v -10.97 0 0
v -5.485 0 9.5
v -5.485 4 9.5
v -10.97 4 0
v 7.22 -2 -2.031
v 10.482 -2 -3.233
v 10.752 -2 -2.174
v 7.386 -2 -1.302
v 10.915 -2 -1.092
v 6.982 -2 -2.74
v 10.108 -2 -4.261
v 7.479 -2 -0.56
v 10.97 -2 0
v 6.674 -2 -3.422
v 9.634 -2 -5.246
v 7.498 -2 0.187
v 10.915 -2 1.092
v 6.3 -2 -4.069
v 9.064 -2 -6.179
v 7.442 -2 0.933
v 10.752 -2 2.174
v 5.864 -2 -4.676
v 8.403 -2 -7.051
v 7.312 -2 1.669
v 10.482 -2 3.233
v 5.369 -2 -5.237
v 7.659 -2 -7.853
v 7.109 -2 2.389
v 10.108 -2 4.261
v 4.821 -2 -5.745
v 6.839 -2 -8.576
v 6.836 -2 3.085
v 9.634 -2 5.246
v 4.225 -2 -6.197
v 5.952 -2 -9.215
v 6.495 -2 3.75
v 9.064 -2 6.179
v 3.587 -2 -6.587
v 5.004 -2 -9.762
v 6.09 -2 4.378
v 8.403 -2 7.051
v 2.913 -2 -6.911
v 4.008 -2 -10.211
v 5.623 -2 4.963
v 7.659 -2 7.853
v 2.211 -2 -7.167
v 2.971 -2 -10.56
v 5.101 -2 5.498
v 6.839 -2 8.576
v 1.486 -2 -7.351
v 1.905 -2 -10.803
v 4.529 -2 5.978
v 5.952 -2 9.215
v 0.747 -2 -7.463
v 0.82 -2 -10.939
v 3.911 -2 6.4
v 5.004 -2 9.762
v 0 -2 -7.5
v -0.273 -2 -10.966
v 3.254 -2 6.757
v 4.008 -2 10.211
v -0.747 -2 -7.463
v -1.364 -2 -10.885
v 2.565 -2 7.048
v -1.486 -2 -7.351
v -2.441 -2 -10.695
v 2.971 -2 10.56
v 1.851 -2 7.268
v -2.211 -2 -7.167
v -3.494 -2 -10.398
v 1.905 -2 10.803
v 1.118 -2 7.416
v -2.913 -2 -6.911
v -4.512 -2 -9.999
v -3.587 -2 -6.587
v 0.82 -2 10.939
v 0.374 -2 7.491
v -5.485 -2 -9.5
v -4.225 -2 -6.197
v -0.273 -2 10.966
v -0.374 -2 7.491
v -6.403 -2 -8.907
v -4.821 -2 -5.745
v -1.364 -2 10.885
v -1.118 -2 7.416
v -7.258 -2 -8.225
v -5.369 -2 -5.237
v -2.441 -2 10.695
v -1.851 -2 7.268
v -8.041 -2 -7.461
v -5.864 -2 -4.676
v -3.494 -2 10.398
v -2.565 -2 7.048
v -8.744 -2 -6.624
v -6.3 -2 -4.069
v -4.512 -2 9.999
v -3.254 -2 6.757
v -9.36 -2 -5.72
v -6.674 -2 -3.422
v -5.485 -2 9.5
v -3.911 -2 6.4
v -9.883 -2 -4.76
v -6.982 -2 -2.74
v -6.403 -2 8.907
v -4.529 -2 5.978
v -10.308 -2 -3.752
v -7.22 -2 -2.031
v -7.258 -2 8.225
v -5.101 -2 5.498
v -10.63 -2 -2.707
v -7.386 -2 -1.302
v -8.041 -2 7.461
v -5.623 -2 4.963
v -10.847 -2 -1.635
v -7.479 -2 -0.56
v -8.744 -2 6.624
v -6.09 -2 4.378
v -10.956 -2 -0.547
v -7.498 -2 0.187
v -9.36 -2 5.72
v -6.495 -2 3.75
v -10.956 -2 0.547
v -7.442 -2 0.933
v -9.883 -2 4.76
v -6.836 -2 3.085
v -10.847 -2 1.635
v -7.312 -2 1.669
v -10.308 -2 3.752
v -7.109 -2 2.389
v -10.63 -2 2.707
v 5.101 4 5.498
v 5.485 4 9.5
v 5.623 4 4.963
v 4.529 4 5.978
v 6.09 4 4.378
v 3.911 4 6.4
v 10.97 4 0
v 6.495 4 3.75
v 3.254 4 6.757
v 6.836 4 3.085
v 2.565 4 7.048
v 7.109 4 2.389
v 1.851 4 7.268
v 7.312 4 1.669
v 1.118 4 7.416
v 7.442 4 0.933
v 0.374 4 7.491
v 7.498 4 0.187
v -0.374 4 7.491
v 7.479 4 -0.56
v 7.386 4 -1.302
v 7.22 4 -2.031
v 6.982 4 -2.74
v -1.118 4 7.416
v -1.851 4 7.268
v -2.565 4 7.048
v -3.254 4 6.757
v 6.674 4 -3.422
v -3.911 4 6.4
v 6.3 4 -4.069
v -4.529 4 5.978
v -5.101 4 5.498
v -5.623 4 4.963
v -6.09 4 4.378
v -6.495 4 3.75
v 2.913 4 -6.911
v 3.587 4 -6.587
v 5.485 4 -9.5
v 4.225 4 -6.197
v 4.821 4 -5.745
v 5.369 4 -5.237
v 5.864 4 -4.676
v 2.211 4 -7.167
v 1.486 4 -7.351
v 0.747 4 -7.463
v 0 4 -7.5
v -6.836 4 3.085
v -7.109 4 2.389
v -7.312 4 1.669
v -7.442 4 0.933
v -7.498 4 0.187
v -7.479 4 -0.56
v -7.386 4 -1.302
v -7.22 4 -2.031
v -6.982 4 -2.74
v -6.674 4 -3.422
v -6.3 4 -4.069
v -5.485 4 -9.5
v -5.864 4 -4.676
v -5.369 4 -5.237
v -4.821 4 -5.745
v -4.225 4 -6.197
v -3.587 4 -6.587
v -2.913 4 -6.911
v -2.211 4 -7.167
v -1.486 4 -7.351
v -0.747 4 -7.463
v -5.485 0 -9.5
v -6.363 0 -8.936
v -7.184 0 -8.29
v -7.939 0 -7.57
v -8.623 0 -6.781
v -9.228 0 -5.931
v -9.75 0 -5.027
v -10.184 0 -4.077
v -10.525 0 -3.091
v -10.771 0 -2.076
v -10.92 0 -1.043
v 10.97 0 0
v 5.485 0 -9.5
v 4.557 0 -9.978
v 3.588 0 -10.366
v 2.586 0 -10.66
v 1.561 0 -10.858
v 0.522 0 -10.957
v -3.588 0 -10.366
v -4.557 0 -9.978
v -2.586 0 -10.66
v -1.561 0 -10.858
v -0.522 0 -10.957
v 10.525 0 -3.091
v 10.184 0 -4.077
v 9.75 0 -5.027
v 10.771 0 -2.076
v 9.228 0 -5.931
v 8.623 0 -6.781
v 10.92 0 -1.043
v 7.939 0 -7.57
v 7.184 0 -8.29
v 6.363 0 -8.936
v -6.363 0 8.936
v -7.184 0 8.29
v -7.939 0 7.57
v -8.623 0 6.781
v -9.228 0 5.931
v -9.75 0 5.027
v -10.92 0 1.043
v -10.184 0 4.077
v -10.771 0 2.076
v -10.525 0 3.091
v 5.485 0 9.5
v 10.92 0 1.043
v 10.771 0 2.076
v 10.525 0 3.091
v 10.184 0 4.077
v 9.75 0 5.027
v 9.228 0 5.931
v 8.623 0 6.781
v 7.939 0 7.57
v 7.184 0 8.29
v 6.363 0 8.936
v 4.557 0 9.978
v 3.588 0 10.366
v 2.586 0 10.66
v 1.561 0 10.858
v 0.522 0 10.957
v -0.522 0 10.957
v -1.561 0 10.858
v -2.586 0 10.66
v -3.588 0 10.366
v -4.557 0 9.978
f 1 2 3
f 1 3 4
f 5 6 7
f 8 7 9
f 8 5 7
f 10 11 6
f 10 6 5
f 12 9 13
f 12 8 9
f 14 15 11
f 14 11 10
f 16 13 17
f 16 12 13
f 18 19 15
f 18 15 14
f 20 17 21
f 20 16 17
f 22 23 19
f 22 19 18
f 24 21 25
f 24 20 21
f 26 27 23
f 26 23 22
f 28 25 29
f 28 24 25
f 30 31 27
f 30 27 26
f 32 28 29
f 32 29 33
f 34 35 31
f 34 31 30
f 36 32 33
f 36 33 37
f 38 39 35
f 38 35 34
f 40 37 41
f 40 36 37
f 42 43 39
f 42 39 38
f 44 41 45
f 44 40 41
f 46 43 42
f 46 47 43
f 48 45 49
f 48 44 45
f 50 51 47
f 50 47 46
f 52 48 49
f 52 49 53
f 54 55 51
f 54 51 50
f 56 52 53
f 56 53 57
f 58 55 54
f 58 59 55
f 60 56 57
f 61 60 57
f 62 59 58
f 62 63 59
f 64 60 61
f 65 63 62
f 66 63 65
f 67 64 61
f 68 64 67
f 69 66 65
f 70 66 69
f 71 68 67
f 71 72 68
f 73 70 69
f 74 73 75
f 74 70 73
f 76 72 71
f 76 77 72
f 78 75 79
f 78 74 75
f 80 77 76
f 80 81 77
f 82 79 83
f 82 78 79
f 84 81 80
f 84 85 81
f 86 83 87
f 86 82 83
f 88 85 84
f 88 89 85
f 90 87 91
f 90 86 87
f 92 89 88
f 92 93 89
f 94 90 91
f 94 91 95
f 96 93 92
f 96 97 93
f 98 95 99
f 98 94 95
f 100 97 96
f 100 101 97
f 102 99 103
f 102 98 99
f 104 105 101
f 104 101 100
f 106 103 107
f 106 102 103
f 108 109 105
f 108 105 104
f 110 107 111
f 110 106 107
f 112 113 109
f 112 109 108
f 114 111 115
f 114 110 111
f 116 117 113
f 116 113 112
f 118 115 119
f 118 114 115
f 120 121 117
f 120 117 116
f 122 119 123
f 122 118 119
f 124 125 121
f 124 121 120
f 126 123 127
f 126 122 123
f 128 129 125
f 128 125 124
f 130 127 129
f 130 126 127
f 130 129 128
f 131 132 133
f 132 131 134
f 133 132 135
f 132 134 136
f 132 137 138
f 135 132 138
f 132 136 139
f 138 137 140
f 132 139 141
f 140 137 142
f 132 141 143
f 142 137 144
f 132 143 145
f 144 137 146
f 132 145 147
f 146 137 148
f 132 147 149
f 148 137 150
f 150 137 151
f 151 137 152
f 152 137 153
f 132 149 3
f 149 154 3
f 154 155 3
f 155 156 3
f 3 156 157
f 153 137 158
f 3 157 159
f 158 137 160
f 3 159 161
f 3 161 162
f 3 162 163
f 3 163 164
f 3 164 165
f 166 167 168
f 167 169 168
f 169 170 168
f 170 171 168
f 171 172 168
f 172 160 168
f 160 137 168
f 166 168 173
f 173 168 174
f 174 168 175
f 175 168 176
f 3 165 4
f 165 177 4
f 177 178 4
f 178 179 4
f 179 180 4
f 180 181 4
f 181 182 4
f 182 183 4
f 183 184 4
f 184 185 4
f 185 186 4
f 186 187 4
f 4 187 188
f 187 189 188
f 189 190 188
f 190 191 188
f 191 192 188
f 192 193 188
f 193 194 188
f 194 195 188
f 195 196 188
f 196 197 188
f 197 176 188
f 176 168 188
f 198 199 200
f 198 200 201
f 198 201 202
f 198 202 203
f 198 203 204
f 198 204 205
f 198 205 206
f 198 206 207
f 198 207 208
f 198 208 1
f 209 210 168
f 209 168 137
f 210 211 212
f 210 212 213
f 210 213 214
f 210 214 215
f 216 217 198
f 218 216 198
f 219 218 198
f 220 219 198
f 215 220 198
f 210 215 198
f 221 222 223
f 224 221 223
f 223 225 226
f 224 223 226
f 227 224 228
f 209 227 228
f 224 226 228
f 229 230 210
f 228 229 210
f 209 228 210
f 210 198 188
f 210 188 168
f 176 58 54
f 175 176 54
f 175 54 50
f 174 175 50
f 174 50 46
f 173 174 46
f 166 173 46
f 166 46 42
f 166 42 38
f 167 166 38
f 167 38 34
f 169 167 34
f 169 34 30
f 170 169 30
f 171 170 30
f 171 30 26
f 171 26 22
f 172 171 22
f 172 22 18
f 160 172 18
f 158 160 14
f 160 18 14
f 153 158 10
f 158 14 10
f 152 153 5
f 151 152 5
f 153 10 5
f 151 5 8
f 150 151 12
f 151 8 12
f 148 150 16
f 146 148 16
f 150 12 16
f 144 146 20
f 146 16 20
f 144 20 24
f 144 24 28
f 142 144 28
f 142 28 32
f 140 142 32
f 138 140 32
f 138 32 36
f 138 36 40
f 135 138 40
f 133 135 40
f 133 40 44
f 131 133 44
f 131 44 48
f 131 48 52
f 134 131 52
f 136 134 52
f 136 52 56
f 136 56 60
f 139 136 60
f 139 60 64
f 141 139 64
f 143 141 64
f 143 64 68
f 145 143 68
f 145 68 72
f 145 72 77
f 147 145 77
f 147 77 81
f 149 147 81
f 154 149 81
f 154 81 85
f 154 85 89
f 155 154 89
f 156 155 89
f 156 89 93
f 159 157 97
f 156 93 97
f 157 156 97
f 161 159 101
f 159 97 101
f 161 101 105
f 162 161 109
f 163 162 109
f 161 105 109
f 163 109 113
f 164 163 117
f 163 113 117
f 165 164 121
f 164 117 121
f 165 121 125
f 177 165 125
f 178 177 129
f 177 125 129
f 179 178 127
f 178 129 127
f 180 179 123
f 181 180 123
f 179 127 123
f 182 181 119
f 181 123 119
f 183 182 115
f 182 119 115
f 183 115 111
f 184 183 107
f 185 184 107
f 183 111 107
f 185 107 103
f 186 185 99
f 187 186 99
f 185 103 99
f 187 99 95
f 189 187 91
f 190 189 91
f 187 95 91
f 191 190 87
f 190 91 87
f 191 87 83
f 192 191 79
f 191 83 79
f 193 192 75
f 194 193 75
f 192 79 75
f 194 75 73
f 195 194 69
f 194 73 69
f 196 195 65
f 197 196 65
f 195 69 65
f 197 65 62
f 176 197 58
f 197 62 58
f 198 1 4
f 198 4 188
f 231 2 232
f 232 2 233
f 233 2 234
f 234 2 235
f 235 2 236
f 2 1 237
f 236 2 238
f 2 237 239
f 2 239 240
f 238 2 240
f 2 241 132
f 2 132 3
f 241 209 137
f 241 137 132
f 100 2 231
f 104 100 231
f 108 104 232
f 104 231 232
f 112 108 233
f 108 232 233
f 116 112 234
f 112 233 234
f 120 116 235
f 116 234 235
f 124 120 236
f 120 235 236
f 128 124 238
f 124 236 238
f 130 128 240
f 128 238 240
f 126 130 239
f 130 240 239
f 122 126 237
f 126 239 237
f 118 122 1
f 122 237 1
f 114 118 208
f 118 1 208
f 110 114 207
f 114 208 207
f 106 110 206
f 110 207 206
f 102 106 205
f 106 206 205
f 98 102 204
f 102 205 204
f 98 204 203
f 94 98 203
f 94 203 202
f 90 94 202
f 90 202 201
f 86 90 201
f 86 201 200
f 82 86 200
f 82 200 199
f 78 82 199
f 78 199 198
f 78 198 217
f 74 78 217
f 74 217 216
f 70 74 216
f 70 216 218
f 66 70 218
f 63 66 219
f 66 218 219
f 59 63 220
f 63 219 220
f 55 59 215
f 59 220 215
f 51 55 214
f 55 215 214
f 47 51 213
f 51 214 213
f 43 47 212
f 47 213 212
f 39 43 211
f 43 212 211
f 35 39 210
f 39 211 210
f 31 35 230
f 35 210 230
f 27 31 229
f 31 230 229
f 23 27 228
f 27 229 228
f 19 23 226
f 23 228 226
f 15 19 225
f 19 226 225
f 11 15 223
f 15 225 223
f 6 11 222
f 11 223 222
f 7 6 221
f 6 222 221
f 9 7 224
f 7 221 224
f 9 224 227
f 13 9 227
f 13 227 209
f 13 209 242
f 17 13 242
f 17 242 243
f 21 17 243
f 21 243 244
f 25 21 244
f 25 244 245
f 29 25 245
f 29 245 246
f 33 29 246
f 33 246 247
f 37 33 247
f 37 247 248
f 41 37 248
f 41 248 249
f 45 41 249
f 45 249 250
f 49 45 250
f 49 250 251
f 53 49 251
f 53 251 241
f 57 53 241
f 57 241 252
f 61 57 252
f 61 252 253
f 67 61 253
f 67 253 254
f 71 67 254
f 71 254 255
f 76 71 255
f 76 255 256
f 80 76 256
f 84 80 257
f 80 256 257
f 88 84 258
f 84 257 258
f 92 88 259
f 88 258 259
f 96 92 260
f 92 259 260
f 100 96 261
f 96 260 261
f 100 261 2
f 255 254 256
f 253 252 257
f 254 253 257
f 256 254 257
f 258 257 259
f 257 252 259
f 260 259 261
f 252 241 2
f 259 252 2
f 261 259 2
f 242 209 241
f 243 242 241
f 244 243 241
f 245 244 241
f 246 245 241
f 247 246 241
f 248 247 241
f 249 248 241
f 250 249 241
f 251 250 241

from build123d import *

# Parameters (mm, degrees)
EXTRUDE_1_DEPTH     = 4
SKETCH_3_R          = 10.969655115
EXTRUDE_2_DEPTH     = 2
SKETCH_4_R          = 7.5
CUT_EXTRUDE_1_DEPTH = 17.633299933


with BuildPart() as part:
    # Эскиз1 → Вытянуть1 (new body)
    with BuildSketch(Plane(origin=(0, 0, 0), x_dir=(1, 0, 0), z_dir=(0, 1, 0))):
        Polygon((-5.484827557, 9.5), (5.484827557, 9.5), (10.969655115, 0), (5.484827557, -9.5), (-5.484827557, -9.5), (-10.969655115, 0), align=None)
    extrude(amount=EXTRUDE_1_DEPTH)

    # Эскиз3 → Вытянуть2 (add)
    with BuildSketch(Plane.XZ):
        Circle(SKETCH_3_R)
    extrude(amount=EXTRUDE_2_DEPTH)

    # Эскиз4 → Вырез-Вытянуть1 (cut, through all)
    with BuildSketch(Plane.XZ.offset(2)):
        Circle(SKETCH_4_R)
    extrude(amount=-CUT_EXTRUDE_1_DEPTH, mode=Mode.SUBTRACT)


solid = part.part
